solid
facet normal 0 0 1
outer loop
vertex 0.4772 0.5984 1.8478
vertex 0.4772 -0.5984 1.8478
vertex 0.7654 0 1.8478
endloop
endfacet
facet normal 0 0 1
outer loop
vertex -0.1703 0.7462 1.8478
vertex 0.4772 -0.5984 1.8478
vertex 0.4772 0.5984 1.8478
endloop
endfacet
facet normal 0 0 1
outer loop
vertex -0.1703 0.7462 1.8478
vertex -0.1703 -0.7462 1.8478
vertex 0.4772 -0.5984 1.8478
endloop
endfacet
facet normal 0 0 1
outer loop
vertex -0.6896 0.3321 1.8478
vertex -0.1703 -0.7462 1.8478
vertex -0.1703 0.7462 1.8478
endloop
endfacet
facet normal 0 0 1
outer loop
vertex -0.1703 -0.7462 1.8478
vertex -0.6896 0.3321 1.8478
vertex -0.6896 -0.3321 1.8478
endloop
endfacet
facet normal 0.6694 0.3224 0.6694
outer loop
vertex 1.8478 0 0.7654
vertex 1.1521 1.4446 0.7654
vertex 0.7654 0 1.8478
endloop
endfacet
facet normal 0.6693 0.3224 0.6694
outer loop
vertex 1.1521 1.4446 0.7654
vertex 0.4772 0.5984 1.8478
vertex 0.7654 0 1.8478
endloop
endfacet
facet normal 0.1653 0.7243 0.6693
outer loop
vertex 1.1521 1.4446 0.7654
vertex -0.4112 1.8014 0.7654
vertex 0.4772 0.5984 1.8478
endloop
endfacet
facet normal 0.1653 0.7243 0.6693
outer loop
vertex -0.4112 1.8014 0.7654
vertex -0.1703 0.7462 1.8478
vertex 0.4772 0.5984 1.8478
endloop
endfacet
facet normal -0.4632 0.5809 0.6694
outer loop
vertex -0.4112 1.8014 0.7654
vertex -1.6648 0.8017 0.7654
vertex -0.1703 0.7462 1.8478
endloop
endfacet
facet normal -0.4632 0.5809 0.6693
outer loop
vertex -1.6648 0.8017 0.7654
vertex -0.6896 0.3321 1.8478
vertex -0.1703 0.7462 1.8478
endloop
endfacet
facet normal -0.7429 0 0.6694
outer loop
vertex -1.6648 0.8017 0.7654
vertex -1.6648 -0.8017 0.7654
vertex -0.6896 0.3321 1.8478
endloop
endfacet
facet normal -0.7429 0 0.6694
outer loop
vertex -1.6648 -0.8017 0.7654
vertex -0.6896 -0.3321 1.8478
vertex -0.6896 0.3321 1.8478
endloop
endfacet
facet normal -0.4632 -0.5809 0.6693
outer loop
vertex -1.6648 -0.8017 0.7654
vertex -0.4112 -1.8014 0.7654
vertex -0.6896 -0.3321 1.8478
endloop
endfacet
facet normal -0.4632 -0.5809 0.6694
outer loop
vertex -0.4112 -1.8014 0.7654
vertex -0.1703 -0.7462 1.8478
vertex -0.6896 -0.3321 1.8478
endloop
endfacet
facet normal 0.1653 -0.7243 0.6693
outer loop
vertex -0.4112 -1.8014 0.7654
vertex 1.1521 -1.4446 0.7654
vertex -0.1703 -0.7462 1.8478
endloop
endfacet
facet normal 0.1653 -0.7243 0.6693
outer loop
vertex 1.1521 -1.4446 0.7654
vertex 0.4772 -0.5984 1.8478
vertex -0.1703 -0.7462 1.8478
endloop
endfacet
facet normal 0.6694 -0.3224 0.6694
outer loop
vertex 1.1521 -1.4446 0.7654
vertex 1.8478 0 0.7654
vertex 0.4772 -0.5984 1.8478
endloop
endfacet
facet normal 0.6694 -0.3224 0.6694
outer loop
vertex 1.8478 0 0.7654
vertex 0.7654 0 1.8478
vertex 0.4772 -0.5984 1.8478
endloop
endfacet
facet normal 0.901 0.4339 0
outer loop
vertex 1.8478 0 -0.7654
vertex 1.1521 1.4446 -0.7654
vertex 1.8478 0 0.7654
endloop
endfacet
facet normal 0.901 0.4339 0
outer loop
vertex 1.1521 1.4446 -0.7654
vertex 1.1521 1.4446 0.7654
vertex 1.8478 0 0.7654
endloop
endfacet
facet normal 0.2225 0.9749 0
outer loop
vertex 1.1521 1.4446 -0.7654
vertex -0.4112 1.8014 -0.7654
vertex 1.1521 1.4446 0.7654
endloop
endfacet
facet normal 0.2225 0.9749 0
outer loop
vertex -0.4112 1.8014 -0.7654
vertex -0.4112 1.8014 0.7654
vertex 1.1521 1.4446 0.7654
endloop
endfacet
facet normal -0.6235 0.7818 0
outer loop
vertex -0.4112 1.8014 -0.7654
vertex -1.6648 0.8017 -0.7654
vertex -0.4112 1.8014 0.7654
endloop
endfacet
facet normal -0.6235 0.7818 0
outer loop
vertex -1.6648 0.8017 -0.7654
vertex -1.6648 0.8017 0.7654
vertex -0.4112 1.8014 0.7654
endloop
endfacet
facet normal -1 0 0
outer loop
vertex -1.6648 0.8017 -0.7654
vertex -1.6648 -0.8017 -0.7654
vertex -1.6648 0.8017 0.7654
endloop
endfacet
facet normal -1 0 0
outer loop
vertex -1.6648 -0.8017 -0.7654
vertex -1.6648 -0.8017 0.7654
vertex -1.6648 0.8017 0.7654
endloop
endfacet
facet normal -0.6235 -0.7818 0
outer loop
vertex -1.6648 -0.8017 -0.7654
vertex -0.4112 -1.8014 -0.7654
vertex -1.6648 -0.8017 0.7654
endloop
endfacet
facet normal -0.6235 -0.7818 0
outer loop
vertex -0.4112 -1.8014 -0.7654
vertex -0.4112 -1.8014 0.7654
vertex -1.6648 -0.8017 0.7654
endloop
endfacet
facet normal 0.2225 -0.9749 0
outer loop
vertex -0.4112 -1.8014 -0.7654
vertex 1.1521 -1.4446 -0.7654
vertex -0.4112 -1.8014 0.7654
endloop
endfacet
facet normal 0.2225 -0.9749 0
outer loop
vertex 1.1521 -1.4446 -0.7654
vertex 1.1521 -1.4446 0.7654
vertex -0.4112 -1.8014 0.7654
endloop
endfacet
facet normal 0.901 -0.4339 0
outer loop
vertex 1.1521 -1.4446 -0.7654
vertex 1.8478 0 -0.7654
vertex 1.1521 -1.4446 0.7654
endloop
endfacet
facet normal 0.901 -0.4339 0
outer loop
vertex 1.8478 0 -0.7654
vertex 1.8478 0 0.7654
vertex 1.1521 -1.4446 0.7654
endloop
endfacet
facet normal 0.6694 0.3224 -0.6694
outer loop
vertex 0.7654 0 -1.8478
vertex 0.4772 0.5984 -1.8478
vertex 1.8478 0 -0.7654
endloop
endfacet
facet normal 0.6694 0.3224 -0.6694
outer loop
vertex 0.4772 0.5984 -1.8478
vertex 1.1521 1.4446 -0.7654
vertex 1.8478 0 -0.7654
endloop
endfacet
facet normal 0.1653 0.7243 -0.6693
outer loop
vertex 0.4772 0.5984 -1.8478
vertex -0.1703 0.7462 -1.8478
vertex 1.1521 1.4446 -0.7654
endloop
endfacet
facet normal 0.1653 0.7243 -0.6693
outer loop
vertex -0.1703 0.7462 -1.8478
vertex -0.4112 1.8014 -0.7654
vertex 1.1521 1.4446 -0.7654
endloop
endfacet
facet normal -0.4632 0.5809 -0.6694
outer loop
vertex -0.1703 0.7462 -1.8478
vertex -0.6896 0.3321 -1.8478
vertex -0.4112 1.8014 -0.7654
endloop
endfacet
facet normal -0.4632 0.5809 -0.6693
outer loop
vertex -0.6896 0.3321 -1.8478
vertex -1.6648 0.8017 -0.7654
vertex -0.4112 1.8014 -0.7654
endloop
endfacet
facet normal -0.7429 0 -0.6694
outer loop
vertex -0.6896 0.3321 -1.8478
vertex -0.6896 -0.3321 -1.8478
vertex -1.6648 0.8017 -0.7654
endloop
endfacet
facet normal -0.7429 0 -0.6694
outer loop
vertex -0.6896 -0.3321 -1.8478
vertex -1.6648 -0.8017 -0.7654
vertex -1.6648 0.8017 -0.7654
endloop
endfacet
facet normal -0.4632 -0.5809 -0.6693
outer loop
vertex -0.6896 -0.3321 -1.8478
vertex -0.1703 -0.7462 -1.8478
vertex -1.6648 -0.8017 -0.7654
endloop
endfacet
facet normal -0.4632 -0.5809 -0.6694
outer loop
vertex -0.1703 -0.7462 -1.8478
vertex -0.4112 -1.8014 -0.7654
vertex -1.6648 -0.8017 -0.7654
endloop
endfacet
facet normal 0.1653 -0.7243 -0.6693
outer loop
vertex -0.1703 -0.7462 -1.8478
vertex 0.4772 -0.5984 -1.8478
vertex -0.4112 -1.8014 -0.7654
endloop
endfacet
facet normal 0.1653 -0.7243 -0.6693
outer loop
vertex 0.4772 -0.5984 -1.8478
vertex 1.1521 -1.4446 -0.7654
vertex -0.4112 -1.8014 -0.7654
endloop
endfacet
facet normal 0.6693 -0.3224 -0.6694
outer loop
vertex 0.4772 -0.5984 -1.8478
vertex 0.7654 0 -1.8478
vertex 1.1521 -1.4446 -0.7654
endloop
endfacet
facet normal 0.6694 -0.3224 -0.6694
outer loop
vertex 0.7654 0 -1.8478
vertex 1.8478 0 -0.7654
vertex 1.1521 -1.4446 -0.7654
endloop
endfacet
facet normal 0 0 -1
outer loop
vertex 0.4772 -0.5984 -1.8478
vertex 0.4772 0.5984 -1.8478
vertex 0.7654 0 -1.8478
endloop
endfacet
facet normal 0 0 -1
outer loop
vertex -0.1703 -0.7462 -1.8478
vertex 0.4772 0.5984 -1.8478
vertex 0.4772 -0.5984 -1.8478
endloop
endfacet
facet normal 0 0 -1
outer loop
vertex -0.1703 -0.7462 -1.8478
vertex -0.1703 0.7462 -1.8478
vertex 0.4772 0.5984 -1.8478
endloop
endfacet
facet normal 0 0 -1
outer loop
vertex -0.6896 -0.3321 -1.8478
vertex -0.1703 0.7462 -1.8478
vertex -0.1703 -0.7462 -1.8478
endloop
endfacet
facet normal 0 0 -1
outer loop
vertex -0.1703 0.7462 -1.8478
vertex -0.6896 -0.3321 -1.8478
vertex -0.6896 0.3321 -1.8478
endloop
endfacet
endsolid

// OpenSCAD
module m() { cube(1); }
a = 1;
echo(a);
b = a + 1;
a = 5;
echo(b, a);
module m() { sphere(2); }
function f() = 1;
function f() = 2;
m();
echo(f());
